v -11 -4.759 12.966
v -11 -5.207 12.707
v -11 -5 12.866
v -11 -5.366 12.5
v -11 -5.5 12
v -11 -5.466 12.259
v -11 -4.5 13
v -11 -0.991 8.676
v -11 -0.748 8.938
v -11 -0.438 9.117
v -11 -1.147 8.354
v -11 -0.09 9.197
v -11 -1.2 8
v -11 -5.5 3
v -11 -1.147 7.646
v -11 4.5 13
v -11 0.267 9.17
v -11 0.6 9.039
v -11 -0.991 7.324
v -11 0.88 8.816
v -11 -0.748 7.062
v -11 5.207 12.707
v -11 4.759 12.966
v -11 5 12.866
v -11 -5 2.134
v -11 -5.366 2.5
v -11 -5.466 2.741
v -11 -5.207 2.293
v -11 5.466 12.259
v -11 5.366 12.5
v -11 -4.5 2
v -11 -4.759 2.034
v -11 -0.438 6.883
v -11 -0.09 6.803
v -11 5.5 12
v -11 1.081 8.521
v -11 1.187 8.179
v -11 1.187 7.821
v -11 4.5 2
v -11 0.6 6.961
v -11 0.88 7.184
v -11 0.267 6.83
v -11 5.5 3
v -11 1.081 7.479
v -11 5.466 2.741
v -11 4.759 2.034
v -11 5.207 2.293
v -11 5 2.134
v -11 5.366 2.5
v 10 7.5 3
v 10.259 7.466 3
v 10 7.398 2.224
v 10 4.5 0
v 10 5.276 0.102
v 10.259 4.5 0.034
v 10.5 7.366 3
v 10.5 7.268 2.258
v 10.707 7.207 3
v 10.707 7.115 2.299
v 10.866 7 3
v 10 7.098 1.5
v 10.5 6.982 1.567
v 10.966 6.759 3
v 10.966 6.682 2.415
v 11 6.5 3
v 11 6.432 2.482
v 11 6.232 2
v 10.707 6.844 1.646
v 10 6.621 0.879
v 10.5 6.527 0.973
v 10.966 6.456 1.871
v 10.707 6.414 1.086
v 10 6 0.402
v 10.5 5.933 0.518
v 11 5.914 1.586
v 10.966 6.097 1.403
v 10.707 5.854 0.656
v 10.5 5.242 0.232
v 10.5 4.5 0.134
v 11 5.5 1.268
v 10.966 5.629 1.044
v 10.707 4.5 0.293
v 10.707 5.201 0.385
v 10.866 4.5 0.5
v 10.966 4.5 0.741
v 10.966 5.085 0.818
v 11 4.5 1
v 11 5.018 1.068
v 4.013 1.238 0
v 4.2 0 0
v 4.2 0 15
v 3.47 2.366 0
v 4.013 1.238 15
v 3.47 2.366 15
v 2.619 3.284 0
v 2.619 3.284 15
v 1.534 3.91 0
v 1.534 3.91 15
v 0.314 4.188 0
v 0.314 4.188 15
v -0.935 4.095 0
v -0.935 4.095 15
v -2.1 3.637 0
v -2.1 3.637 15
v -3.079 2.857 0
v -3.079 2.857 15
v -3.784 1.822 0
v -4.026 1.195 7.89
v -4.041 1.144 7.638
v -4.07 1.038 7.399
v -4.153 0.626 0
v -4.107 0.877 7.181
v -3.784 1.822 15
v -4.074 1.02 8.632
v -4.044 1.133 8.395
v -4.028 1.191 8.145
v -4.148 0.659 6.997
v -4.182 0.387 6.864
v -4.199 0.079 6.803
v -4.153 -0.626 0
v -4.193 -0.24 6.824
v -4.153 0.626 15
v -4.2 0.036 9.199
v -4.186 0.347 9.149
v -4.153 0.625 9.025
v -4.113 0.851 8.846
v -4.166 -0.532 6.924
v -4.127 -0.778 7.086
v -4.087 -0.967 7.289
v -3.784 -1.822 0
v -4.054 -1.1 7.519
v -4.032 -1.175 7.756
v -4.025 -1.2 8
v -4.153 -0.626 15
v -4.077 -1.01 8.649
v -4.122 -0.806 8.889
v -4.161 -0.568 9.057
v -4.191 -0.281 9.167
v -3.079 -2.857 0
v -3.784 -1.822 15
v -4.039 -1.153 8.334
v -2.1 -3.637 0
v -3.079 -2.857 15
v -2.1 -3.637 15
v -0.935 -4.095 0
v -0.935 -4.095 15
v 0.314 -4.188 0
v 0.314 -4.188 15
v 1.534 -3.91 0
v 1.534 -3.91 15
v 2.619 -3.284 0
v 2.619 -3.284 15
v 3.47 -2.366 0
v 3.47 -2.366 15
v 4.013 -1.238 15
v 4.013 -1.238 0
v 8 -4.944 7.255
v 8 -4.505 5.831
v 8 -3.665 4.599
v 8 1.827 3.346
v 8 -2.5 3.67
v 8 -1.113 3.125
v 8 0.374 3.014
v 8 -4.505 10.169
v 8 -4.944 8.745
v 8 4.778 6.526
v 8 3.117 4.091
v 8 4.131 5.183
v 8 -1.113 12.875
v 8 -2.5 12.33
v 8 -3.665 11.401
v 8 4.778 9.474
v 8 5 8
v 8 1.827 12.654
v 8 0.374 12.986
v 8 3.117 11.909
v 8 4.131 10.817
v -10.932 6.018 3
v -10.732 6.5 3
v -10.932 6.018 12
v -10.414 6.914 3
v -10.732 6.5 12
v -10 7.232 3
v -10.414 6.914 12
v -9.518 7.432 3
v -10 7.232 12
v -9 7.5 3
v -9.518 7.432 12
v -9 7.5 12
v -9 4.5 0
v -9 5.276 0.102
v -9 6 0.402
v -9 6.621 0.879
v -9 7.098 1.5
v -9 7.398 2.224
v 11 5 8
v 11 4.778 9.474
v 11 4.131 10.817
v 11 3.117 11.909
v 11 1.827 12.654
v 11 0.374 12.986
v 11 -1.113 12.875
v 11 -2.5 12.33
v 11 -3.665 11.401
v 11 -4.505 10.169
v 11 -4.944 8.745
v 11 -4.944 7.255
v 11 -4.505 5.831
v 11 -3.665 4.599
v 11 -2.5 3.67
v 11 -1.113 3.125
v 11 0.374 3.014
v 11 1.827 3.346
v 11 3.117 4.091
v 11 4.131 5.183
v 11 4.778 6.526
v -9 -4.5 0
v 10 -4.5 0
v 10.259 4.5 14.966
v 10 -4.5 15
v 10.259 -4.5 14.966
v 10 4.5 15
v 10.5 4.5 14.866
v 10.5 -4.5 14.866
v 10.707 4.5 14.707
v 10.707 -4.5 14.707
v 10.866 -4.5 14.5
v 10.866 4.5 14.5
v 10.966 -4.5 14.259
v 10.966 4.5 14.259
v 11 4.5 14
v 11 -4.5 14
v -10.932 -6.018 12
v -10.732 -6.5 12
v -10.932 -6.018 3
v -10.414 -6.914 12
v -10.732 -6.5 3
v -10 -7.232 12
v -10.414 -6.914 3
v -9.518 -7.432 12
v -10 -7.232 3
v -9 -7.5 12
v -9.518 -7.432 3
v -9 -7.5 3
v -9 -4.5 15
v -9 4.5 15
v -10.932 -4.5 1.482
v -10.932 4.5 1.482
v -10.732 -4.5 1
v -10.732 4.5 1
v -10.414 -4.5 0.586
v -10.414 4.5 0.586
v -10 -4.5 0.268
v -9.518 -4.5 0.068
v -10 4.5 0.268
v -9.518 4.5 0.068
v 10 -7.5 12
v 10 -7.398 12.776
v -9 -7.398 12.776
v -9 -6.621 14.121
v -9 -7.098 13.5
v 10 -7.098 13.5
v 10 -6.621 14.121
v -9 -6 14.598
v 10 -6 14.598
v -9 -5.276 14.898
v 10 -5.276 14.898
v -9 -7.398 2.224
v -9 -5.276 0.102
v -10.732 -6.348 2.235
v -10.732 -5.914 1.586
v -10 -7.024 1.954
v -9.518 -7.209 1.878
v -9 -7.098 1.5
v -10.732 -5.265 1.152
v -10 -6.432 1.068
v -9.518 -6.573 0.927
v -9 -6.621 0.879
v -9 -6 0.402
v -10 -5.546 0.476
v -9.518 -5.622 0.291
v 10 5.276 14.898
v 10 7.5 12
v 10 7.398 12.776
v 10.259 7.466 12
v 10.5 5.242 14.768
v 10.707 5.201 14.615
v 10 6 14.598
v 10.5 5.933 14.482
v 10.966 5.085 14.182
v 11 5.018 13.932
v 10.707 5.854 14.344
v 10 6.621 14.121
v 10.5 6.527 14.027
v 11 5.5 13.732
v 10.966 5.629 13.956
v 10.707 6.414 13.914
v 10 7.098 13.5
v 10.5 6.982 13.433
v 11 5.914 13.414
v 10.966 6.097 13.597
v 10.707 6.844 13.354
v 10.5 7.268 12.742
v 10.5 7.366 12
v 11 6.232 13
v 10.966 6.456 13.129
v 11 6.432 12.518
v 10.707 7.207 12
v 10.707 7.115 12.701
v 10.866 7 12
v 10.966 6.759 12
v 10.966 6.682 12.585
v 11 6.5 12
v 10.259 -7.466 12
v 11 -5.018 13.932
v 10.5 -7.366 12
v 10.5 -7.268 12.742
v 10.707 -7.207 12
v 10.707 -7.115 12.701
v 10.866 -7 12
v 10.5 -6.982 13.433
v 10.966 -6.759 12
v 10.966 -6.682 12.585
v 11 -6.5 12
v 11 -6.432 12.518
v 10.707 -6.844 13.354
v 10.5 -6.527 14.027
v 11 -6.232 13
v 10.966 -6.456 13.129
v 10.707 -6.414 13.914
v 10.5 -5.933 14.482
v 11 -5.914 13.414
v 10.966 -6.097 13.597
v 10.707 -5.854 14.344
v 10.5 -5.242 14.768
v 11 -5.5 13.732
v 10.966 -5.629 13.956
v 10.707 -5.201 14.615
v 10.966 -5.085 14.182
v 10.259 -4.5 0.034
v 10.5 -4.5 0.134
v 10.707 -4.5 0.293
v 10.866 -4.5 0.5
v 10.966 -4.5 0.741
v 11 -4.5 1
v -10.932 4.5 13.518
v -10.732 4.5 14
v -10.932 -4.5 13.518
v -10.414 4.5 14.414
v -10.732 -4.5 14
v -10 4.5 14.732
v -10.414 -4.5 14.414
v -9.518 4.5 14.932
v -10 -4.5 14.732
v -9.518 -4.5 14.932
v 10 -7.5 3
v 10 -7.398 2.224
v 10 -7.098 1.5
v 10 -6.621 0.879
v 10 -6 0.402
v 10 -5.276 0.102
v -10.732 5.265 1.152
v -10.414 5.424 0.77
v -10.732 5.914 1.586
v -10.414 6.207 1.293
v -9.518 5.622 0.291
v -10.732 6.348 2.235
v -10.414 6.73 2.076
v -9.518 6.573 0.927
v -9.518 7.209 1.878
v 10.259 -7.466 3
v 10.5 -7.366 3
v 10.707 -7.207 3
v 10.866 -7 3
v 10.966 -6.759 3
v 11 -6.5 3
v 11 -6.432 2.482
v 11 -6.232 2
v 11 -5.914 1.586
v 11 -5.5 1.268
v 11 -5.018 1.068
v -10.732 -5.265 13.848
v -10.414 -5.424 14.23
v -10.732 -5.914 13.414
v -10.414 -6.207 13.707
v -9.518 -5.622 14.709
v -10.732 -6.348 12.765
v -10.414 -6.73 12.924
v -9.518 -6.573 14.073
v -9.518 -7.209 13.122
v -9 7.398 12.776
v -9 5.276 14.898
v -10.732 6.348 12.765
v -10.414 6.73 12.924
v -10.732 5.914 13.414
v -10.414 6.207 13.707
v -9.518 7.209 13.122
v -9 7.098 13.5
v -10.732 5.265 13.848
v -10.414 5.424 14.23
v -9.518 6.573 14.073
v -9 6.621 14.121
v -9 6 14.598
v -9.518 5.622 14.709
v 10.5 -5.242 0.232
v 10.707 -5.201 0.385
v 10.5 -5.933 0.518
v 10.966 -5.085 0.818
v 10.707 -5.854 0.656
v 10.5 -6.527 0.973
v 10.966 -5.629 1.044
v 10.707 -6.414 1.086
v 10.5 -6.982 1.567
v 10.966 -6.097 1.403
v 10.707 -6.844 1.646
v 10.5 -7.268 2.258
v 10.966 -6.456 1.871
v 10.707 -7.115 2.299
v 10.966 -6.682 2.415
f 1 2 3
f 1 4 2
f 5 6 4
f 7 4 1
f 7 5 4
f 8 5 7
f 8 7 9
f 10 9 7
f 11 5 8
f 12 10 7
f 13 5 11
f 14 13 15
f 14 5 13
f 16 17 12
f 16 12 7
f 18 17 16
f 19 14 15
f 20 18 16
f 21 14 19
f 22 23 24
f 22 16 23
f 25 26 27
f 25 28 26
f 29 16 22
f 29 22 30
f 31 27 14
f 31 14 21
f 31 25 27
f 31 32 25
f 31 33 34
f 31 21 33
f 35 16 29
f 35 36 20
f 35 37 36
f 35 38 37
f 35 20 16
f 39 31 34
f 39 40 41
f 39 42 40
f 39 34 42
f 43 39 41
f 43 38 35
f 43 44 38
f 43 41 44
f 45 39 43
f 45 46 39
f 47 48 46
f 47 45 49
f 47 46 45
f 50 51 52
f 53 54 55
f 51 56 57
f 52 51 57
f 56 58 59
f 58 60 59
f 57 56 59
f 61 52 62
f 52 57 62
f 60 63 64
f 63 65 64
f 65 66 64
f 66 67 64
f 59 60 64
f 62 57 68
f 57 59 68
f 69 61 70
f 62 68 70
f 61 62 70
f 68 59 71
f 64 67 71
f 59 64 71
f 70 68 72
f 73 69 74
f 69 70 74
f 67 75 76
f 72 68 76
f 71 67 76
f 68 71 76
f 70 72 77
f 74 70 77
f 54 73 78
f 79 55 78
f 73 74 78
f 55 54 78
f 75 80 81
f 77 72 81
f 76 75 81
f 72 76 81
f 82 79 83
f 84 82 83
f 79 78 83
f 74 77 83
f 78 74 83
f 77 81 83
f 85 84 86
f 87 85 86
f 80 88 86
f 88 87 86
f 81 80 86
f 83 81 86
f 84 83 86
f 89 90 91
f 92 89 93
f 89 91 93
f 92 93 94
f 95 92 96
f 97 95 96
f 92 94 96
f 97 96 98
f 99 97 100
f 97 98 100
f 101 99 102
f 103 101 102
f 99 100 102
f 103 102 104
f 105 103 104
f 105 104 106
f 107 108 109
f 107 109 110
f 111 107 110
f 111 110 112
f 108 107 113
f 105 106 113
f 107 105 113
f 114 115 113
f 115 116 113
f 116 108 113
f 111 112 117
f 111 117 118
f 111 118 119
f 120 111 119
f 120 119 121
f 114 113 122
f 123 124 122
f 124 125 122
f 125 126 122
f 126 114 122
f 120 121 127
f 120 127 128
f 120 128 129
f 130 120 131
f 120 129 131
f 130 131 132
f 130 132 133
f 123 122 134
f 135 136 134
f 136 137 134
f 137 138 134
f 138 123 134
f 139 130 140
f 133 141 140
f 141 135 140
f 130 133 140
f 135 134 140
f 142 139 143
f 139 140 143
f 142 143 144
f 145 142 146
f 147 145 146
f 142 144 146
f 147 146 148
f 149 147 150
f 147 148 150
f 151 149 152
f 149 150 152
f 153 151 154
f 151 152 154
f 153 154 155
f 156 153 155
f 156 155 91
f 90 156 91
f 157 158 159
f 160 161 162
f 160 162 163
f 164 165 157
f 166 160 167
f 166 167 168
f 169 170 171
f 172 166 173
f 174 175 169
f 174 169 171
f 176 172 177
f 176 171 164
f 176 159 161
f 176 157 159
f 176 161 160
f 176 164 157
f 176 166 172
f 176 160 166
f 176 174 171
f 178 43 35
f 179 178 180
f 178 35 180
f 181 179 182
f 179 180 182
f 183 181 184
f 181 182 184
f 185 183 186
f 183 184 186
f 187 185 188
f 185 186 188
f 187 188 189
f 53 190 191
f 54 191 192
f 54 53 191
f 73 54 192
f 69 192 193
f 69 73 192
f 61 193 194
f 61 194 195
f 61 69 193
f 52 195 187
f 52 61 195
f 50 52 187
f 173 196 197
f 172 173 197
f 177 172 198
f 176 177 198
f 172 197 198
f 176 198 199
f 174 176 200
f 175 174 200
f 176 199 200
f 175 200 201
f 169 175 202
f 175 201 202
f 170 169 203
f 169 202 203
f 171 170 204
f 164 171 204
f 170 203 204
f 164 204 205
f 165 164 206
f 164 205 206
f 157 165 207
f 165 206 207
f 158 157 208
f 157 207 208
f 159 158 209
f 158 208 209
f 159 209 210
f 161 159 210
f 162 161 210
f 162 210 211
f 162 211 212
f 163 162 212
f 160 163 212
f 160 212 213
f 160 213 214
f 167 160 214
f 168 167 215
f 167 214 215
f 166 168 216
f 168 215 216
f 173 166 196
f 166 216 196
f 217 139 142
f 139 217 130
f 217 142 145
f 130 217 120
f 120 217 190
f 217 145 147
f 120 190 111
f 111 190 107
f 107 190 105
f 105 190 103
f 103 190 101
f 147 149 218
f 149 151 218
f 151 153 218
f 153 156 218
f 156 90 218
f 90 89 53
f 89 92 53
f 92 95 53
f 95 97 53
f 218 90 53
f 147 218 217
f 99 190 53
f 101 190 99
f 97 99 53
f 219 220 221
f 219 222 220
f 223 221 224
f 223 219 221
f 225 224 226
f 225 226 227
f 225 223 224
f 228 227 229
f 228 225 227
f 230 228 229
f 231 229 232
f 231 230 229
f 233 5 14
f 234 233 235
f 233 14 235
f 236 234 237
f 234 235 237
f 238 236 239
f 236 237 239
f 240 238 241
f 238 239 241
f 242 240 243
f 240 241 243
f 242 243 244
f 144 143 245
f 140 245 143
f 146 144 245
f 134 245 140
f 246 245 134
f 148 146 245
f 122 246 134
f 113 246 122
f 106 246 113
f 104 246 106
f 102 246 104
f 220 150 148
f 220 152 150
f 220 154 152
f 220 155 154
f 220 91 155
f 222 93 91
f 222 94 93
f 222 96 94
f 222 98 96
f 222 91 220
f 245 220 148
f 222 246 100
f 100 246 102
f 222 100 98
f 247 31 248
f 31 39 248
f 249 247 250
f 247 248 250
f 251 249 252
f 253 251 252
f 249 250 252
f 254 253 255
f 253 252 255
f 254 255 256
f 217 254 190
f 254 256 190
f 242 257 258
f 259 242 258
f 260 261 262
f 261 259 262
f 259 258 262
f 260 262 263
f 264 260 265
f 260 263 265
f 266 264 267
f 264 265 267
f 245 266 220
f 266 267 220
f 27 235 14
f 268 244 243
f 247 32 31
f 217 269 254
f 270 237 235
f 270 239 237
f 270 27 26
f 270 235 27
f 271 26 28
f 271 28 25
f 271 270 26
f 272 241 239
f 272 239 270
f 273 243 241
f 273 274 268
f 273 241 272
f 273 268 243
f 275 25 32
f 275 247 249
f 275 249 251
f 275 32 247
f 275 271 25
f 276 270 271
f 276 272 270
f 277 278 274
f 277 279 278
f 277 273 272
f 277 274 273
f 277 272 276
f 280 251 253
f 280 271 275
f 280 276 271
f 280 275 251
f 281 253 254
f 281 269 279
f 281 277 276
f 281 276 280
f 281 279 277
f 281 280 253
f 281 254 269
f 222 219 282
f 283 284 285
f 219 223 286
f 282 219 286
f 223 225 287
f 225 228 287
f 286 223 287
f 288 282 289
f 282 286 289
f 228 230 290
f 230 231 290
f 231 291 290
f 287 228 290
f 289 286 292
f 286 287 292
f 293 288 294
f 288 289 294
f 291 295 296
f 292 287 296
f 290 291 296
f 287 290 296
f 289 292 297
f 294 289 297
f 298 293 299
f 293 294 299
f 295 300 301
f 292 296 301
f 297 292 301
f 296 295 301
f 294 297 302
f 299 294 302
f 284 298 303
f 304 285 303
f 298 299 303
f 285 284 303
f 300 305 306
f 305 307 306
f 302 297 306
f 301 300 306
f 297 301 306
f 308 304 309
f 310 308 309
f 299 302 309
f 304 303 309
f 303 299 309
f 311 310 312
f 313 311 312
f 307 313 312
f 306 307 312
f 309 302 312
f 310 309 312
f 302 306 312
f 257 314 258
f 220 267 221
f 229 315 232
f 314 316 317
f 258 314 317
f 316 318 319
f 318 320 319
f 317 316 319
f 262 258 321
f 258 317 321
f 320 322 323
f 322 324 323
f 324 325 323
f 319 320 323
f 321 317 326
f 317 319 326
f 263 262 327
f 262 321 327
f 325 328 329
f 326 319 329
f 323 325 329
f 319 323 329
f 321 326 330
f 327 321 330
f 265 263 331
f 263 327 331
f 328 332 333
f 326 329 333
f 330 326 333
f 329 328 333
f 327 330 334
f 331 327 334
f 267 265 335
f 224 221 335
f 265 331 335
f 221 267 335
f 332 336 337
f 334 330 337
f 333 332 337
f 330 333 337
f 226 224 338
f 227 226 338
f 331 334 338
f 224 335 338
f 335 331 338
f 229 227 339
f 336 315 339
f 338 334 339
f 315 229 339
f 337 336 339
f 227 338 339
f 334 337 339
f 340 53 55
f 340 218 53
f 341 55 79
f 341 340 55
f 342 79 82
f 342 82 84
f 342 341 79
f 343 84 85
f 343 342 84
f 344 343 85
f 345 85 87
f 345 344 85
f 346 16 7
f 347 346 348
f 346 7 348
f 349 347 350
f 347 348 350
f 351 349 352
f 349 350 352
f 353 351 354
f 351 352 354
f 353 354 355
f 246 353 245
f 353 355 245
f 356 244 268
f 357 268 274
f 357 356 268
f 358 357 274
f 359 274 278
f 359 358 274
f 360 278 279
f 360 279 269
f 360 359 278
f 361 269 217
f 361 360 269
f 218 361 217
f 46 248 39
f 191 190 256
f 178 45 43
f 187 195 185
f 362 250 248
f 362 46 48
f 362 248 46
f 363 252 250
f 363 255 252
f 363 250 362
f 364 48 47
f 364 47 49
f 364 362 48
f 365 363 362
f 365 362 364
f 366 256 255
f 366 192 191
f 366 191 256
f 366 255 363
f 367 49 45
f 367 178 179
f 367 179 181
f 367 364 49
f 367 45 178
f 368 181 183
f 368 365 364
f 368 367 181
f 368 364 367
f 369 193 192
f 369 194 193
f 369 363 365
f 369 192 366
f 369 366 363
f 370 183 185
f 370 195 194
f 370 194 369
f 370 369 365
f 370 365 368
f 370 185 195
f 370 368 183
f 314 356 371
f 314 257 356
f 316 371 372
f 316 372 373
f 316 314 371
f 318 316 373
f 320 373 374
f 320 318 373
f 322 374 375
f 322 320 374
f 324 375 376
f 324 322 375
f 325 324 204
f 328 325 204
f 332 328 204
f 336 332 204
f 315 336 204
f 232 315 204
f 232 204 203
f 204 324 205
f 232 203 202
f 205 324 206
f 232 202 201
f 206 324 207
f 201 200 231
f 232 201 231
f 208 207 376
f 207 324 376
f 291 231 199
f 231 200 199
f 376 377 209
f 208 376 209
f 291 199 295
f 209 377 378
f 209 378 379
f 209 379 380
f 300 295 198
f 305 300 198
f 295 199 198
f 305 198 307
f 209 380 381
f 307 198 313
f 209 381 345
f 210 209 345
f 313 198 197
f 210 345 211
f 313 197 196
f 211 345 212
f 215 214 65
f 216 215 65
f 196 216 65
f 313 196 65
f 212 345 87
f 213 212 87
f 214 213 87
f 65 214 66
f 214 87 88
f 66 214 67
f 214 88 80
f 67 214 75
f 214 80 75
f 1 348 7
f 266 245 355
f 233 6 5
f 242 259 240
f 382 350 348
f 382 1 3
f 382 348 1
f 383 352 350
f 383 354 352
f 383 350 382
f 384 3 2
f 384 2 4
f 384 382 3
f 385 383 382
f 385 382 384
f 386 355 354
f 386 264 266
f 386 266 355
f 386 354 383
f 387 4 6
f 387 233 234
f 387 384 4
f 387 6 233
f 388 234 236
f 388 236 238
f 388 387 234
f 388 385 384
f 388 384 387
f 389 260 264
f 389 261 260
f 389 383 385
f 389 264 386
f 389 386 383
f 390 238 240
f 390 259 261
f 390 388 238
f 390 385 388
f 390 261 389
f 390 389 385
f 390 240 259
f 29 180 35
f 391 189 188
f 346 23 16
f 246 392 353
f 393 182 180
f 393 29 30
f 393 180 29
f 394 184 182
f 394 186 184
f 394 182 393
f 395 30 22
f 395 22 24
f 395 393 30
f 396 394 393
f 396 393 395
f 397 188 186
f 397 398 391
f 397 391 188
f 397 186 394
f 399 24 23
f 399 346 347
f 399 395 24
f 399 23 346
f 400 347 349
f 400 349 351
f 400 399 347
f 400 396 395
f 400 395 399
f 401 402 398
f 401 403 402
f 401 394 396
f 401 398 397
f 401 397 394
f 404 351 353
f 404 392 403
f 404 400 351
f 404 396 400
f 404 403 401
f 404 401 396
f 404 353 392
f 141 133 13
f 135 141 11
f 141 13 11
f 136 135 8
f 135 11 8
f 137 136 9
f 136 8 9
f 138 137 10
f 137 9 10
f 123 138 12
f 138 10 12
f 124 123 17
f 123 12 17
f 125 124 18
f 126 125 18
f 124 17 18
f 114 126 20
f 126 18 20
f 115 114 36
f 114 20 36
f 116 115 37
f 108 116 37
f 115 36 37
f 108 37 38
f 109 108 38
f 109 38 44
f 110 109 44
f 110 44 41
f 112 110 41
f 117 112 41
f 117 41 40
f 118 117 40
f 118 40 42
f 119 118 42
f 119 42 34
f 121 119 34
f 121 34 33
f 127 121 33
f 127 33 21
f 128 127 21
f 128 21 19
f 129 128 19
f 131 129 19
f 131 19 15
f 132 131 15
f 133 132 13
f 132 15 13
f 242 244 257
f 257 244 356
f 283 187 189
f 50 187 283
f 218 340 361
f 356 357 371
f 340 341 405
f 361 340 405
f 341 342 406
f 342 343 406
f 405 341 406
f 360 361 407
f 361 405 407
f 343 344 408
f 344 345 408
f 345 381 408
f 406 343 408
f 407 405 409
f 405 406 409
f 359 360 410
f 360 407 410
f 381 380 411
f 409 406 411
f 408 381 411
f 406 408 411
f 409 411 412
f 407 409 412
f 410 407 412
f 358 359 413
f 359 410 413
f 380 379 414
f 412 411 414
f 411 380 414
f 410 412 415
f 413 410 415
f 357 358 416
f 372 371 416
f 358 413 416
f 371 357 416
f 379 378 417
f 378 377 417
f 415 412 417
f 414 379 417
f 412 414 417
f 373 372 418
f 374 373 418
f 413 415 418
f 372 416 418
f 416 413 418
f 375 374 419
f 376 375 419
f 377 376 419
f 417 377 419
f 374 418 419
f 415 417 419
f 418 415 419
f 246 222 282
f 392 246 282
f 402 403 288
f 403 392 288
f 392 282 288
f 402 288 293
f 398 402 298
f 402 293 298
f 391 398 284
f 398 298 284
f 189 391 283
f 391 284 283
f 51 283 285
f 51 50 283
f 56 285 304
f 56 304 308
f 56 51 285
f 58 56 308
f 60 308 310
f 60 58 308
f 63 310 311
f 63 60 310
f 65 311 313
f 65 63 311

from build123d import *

# Parameters (mm, degrees)
SKETCH_W        = 22
SKETCH_H        = 15
PAD_DEPTH       = 15
SKETCH001_R     = 4.2
POCKET_DEPTH    = 15.001
SKETCH002_R     = 5
POCKET001_DEPTH = 3
SKETCH003_R     = 1.2
POCKET002_DEPTH = 10
FILLET_R        = 3
FILLET001_R     = 1
FILLET002_R     = 2


with BuildPart() as part:
    # Sketch → Pad (new body)
    with BuildSketch(Plane.XY):
        Rectangle(SKETCH_W, SKETCH_H)
    extrude(amount=PAD_DEPTH)

    # Sketch001 → Pocket (cut, through all)
    with BuildSketch(Plane.XY.offset(15)):
        Circle(SKETCH001_R)
    extrude(amount=-POCKET_DEPTH, mode=Mode.SUBTRACT)

    # Sketch002 → Pocket001 (cut)
    with BuildSketch(Plane.YZ.offset(11)):
        with Locations((0, 8)):
            Circle(SKETCH002_R)
    extrude(amount=-POCKET001_DEPTH, mode=Mode.SUBTRACT)

    # Sketch003 → Pocket002 (cut)
    with BuildSketch(Plane(origin=(-11, 0, 0), x_dir=(0, -1, 0), z_dir=(-1, 0, 0))):
        with Locations((0, 8)):
            Circle(SKETCH003_R)
    extrude(amount=-POCKET002_DEPTH, mode=Mode.SUBTRACT)

    # Fillet
    fillet_edges = [part.edges().sort_by_distance(p)[0] for p in [
        (0, -7.5, 15),
        (0, -7.5, 0),
        (0, 7.5, 15),
        (0, 7.5, 0),
    ]]
    fillet(fillet_edges, radius=FILLET_R)

    # Fillet001
    fillet001_edges = [part.edges().sort_by_distance(p)[0] for p in [
        (11, 0, 15),
    ]]
    fillet(fillet001_edges, radius=FILLET001_R)

    # Fillet002
    fillet002_edges = [part.edges().sort_by_distance(p)[0] for p in [
        (-11, 0, 0),
    ]]
    fillet(fillet002_edges, radius=FILLET002_R)


solid = part.part
